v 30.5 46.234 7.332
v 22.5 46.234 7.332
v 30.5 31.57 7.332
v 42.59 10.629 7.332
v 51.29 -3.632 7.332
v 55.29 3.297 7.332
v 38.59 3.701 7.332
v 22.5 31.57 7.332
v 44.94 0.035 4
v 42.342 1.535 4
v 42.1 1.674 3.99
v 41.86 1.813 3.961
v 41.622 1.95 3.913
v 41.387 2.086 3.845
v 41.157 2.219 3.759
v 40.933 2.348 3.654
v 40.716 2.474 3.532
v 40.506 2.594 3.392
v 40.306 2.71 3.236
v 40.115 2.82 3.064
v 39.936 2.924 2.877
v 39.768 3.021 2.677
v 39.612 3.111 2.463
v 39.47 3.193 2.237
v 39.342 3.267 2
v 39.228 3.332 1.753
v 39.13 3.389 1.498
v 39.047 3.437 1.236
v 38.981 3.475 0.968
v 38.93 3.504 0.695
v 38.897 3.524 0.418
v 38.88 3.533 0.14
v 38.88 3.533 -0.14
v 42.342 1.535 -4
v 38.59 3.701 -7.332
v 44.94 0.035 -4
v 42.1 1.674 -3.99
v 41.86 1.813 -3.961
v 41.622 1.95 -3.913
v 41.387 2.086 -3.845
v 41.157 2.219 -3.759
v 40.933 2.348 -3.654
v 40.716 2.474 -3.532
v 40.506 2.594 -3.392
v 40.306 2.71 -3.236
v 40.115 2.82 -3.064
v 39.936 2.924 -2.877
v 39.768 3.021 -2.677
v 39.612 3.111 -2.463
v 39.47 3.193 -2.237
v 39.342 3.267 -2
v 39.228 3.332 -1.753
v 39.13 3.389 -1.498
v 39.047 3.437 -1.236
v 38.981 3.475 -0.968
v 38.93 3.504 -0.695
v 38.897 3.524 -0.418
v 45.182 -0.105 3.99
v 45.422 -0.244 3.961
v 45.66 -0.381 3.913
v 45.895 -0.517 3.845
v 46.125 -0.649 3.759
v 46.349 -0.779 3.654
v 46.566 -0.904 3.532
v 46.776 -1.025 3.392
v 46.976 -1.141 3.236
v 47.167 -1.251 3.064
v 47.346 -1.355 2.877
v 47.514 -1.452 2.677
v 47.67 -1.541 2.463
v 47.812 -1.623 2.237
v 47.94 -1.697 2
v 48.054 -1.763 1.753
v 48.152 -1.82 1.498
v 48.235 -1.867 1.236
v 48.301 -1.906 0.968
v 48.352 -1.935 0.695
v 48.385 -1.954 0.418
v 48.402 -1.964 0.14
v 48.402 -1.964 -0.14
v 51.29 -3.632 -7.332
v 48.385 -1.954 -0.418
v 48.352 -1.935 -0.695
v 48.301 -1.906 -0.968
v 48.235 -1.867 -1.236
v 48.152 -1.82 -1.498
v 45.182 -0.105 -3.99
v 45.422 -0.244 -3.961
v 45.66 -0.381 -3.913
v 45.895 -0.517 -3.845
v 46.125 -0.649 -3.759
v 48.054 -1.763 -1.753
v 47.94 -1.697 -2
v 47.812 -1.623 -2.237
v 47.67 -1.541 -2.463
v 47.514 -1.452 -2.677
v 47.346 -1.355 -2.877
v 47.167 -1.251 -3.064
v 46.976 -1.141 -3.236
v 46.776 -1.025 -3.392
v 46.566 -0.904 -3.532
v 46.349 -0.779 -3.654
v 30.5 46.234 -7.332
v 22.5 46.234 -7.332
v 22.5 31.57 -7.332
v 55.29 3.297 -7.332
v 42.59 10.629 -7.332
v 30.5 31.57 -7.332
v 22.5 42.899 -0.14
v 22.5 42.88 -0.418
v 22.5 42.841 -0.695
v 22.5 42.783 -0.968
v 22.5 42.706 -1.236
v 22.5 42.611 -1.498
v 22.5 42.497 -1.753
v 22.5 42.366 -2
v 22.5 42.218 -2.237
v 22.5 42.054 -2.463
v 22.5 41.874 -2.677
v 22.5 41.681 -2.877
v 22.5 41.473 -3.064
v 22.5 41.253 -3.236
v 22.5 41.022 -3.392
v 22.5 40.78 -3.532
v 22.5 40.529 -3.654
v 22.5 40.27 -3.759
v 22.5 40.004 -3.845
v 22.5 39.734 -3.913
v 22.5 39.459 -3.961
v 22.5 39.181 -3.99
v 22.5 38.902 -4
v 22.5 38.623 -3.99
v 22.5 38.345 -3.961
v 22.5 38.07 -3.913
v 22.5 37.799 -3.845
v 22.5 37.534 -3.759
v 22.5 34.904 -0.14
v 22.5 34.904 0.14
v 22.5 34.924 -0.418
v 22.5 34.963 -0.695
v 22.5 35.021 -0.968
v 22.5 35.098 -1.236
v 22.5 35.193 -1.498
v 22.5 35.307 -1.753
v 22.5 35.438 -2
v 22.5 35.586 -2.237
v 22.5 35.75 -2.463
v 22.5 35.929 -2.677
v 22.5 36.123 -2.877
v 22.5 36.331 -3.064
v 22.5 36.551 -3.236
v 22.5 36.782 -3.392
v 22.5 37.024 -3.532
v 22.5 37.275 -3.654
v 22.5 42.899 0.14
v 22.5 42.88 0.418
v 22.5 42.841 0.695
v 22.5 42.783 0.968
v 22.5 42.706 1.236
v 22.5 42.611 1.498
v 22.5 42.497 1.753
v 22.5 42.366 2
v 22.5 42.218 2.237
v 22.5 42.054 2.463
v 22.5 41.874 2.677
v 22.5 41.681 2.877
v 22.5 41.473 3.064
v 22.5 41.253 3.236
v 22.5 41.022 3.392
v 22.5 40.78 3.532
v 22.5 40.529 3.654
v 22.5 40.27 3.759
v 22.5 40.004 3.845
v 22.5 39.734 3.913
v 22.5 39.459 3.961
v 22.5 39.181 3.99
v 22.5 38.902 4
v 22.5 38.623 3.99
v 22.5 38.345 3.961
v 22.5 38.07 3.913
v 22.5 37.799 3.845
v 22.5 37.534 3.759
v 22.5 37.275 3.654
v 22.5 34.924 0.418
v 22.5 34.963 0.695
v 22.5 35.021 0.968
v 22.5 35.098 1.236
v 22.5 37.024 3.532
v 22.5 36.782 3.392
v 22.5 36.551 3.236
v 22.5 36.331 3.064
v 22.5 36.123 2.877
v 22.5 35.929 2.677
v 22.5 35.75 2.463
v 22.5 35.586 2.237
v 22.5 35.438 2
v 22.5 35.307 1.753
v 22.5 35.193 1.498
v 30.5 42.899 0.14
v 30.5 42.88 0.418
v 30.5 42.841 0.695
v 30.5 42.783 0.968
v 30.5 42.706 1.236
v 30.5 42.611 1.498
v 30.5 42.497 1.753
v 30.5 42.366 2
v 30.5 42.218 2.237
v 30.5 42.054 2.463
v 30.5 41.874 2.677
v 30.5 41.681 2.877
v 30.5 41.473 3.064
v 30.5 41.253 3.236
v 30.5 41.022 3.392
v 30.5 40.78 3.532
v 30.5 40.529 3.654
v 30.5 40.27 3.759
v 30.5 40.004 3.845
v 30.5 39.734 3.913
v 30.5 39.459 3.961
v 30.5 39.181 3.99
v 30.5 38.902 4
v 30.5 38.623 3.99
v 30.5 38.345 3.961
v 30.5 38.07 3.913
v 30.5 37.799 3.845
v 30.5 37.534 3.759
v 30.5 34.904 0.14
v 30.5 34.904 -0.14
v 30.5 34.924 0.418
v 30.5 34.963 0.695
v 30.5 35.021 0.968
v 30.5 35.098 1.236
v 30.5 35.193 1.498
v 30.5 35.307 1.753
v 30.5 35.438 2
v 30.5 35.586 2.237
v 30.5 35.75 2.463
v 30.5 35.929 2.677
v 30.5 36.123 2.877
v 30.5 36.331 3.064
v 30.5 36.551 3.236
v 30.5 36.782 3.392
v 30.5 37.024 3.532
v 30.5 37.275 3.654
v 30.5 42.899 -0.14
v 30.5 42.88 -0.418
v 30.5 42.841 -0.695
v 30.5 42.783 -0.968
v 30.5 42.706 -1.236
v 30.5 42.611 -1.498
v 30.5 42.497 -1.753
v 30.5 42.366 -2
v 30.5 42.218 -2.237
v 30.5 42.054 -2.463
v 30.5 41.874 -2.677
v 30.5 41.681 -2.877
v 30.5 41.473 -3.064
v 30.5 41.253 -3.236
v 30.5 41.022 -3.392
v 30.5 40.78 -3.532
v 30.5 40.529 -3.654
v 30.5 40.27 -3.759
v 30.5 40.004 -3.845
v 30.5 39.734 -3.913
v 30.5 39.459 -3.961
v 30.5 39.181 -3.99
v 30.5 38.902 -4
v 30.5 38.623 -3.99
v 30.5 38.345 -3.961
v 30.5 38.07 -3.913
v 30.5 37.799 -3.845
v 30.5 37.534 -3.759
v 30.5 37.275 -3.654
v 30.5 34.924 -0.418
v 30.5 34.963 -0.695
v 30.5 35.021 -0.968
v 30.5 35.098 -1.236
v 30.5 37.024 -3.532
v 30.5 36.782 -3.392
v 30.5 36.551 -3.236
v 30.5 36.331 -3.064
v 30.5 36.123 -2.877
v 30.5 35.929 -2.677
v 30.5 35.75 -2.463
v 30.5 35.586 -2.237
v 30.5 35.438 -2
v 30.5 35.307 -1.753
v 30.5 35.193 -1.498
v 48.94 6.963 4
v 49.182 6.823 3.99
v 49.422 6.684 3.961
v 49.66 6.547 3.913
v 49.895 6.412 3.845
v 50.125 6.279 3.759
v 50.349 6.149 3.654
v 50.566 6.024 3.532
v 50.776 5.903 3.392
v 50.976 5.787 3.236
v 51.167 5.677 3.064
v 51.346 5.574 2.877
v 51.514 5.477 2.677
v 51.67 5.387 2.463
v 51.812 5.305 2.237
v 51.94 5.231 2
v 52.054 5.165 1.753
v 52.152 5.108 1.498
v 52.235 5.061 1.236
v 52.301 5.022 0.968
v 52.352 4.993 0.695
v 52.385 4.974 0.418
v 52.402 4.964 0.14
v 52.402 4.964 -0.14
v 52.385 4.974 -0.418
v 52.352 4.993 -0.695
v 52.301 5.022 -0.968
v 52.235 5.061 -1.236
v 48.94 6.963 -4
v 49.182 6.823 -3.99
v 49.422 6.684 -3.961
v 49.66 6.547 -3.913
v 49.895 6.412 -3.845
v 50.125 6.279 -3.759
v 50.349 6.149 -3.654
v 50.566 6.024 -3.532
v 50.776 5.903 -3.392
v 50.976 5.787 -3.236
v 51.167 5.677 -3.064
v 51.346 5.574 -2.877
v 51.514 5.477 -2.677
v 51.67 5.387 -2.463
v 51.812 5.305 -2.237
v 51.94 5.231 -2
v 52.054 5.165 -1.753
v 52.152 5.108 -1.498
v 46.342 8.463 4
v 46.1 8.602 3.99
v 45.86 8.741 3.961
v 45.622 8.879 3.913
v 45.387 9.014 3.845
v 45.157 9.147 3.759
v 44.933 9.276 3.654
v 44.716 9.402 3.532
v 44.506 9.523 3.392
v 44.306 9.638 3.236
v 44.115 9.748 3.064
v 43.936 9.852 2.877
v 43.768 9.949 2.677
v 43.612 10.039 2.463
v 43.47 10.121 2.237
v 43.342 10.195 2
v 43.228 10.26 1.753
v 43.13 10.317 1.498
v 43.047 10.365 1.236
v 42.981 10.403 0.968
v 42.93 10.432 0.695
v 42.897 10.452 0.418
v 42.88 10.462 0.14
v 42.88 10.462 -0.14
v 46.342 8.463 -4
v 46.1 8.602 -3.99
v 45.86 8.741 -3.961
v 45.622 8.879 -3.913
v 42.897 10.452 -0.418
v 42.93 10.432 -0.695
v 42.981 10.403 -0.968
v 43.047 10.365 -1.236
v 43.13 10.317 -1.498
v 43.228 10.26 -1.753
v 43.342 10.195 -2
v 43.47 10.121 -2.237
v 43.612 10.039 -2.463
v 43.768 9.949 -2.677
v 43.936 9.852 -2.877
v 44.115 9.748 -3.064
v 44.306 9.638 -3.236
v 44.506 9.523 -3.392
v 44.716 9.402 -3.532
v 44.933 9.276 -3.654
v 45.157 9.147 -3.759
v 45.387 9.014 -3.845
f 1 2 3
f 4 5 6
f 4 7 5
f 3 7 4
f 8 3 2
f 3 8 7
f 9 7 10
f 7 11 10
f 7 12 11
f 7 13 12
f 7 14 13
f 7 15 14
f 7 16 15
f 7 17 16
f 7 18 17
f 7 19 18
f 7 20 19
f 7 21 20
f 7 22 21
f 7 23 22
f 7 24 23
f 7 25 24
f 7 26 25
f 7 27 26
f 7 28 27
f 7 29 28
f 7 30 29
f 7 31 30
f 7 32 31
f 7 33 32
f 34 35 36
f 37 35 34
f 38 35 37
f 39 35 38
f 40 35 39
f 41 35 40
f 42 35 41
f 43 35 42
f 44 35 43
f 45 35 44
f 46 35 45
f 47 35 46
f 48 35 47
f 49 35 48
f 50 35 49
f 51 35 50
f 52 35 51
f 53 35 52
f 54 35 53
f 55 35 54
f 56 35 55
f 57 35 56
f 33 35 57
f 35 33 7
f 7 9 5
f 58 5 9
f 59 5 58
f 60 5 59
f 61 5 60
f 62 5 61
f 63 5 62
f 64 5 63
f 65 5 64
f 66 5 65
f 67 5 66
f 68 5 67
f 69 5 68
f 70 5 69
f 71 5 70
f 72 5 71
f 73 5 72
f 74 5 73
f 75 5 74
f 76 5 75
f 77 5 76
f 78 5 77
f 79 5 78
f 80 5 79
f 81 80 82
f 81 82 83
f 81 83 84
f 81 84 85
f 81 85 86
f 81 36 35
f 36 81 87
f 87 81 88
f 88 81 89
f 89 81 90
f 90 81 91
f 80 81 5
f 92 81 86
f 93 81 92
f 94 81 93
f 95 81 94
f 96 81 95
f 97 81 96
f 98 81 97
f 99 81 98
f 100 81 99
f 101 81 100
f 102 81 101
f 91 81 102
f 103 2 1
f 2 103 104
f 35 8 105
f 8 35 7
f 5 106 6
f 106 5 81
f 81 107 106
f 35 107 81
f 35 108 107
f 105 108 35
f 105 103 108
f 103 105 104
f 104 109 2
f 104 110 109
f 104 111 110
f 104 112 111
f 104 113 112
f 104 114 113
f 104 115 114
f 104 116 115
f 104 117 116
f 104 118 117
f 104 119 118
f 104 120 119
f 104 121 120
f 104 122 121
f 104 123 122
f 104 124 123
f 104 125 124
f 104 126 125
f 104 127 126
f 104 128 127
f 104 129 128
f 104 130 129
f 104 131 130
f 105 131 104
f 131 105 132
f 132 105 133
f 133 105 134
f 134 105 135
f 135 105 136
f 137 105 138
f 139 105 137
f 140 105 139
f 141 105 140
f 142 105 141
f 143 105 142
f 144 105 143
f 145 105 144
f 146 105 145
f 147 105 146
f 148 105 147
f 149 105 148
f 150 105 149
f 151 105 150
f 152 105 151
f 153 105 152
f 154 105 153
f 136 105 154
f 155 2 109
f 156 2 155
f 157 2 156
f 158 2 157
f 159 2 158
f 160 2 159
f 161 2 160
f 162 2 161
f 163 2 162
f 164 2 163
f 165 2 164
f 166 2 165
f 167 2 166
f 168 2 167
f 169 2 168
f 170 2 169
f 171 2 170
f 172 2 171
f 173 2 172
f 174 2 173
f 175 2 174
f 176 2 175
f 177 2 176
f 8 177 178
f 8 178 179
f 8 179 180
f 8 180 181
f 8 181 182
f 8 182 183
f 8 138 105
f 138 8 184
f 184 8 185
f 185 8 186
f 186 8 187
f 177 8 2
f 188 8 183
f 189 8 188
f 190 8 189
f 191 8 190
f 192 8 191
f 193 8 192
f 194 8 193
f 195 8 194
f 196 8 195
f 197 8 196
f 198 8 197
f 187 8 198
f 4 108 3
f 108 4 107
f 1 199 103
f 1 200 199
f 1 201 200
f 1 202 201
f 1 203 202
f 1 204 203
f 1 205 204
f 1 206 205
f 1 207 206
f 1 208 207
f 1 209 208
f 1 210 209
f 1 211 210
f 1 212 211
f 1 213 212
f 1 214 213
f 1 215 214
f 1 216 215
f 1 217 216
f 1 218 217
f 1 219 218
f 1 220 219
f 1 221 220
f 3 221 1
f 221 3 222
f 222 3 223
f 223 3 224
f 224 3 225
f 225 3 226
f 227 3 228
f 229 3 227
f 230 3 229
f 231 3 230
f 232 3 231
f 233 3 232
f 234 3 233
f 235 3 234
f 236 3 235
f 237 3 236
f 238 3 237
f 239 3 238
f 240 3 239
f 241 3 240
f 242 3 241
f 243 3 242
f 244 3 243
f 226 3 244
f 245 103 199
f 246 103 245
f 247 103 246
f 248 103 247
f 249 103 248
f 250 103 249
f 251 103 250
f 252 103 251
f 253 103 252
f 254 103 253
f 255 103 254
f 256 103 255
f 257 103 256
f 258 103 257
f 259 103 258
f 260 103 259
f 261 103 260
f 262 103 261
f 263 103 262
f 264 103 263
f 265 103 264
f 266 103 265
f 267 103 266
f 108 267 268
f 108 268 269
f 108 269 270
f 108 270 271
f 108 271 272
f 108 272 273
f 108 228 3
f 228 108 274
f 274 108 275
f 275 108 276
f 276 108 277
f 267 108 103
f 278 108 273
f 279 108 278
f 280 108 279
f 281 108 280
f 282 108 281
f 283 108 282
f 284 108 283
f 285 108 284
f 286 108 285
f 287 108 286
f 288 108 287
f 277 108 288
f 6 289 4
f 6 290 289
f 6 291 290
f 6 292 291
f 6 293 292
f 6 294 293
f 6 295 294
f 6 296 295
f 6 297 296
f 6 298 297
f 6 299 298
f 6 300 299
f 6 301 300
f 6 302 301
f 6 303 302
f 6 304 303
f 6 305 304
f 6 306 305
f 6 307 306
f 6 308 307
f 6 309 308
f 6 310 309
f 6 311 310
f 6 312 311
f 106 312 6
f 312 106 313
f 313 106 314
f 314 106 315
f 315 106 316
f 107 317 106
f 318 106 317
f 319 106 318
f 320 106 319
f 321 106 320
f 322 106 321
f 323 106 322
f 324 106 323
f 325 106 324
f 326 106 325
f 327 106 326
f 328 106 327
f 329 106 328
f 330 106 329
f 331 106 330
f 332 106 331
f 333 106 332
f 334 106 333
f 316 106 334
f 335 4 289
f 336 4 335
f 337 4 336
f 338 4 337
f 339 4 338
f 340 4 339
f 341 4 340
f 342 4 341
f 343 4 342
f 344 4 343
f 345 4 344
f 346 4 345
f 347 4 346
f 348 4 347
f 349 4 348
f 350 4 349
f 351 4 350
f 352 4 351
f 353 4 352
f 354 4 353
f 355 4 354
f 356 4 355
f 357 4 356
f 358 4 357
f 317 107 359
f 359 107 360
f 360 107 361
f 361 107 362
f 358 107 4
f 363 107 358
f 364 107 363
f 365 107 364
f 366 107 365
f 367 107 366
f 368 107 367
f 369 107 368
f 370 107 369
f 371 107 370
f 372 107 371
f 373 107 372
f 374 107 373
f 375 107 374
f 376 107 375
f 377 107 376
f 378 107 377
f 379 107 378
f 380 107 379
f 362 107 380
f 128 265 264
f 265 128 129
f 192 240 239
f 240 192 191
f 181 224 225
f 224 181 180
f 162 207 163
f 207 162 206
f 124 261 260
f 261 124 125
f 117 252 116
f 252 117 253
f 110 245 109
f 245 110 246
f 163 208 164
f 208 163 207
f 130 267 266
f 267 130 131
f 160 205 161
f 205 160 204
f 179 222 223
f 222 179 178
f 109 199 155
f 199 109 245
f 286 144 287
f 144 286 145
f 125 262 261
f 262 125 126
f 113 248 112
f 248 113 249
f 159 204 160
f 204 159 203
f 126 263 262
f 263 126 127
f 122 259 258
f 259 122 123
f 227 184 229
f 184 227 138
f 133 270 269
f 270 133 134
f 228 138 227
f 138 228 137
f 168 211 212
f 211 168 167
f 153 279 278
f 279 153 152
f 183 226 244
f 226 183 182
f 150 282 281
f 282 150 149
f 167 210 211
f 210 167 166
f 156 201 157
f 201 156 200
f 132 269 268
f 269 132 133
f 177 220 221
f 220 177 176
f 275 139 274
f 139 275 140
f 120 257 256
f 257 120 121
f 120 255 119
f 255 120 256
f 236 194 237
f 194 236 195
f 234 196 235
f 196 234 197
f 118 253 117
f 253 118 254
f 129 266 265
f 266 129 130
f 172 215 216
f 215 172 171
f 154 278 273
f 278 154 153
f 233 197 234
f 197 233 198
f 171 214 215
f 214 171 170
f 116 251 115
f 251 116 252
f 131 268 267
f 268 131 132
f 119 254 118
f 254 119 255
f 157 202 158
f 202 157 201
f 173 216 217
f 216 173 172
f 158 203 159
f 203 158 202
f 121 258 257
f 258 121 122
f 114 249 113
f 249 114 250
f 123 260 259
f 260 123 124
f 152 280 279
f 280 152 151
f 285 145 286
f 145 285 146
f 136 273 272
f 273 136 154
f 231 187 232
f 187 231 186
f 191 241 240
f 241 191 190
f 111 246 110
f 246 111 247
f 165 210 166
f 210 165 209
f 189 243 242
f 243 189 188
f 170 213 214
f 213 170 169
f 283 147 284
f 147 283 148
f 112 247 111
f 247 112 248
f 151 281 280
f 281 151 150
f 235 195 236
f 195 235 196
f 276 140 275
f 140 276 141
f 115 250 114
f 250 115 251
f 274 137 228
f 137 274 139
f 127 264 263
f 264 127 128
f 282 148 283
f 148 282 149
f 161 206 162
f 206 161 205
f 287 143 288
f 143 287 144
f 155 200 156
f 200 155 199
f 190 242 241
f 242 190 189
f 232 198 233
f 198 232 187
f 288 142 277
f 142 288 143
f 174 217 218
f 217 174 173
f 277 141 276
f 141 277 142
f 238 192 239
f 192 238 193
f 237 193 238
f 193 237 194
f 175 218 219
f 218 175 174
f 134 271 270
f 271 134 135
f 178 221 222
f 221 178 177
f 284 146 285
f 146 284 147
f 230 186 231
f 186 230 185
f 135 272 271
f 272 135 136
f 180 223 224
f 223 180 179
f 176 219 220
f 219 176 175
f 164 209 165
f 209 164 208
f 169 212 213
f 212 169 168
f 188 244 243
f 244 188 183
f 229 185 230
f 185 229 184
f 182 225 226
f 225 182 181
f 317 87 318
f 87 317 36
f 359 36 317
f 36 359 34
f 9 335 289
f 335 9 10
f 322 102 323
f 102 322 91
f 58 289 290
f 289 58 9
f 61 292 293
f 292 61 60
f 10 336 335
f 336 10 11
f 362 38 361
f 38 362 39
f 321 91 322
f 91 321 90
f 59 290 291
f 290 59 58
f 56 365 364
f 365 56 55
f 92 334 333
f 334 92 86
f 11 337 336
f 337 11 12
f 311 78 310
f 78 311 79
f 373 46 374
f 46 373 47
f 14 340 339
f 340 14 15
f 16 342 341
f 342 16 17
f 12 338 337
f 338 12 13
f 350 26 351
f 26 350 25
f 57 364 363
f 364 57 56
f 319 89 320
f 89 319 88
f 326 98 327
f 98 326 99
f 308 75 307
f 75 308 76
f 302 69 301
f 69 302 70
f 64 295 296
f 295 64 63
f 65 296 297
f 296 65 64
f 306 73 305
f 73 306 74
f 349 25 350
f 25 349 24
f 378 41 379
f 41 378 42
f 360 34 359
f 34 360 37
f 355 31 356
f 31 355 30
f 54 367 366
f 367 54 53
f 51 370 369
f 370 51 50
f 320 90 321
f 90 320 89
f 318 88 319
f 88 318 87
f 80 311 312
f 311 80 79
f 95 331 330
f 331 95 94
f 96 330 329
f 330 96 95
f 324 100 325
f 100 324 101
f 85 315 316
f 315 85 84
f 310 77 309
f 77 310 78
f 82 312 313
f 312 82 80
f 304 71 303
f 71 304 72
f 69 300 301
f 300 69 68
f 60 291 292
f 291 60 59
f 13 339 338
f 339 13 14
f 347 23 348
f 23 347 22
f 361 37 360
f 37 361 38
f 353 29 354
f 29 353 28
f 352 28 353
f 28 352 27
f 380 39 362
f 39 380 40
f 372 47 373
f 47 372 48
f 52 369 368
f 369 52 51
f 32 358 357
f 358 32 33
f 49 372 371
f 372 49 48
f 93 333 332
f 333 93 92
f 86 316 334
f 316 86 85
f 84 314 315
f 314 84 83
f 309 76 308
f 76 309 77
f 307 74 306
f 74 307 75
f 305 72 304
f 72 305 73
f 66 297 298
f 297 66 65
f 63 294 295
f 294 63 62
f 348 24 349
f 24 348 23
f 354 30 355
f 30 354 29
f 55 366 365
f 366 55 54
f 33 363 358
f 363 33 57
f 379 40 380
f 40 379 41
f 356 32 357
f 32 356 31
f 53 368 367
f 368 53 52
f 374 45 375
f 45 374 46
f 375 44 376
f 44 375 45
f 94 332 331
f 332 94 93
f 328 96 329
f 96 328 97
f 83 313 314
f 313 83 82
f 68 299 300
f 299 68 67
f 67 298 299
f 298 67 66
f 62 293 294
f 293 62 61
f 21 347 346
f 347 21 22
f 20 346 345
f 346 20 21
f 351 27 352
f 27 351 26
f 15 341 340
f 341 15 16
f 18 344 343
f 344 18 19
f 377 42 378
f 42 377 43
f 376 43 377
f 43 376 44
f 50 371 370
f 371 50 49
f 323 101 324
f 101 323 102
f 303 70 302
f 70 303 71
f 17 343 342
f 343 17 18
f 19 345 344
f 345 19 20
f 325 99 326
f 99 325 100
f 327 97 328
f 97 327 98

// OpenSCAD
// diameter of the tube (mm)
tubeDiameter = 2.197*25.4; 

// hole size of the bearing (mm)
bearingHoleDiameter = 8;

// bearing diameter (mm)
bearingDiameter = 22;

// bearing width (mm)
bearingWidth = 7;

// bearing collar thickness (mm)
bearingCollarThickness = 2;

// minimum thickness of the walls (mm)
wallThickness = 15;

// minimum thickness of the walls (mm)
wallHeight = 0;

// the space between the bearing and the wall (mm)
tolerance = 2;

// the space between the tube and the wall (mm)
tubeTolerance = 2;

// determines beefiness of edge extensions
beefiness = 2;//9;

reinforcement = 8;

hexHead = 25.4/2;

module Outer() {
translate([bearingWidth/2,tubeDiameter/2+bearingDiameter/2,0])
    rotate([0,90,0]) union() {
        hull() {
                cylinder(r=bearingHoleDiameter/2+bearingCollarThickness,h=0.01,$fn=90);
                translate([0,0,tolerance])
                    cylinder(r=bearingHoleDiameter/2+bearingCollarThickness+tolerance,h=0.01,$fn=90);
        }
        translate([-bearingDiameter/2-wallHeight,-bearingDiameter/2-wallThickness,tolerance])
            cube([bearingDiameter+2*wallHeight,bearingDiameter+wallThickness+2*tolerance,wallThickness]);
        hull() {
                translate([0,0,2*tolerance+wallThickness])
                    cylinder(r=bearingHoleDiameter/2+bearingCollarThickness,h=0.01,$fn=90);
                translate([0,0,tolerance+wallThickness])
                    cylinder(r=bearingHoleDiameter/2+bearingCollarThickness+tolerance,h=0.01,$fn=90);
        }
    }
}

module cylinder_outer(height,radius,fn){
   fudge = 1/cos(180/fn);
   cylinder(h=height,r=radius*fudge,$fn=fn);
}
fudge = 1/cos(180/6);
module BraceSingle() {
    lip = 0;
translate([bearingWidth/2,tubeDiameter/2+bearingDiameter/2,0])
    rotate([0,90,0]) union() {
        hull() {
                translate([-lip/2-fudge*hexHead/2,-lip/2-fudge*hexHead/2,2*tolerance+wallThickness])
                    cube([fudge*hexHead+lip,fudge*hexHead+lip,reinforcement]);
        }
    }
}

module BraceReliefSingle() {
    lip = 0;
translate([bearingWidth/2,tubeDiameter/2+bearingDiameter/2,0])
    rotate([0,90,0]) union() {
        hull() {
                translate([-lip/2-fudge*hexHead/2,-lip/2-fudge*hexHead/2,2*tolerance+wallThickness+reinforcement])
                    cube([fudge*hexHead+lip,fudge*hexHead+lip,100]);
        }
    }
}

module Inner() {
    translate([bearingWidth/2,tubeDiameter/2+bearingDiameter/2,0])
        rotate([0,90,0]) 
            cylinder(r=bearingHoleDiameter/2,h=100, $fn=90); // arbitrary large value for hole length
}

module Bearing() {
    translate([0,tubeDiameter/2+bearingDiameter/2,0])
        rotate([0,90,0]) color("red", 0.5)
            cylinder(r=bearingDiameter/2,h=bearingWidth, center=true, $fn=90); 
}

module Tube() {
    color("green", 0.5)
        cylinder(r=tubeDiameter/2,h=100, center=true, $fn=90); 
}

module Brace()
{
    elongate = 3;
    difference() {
        hull() {
            BraceSingle();
            rotate([0,0,-120]) mirror([1,0,0]) BraceSingle();
        }
        hull() {
            BraceReliefSingle();
            rotate([0,0,-120]) mirror([1,0,0]) {
                BraceReliefSingle();
            }
        }
        Inner();
        hull() rotate([0,0,-120]) mirror([1,0,0]) {
            Inner();
            translate([0,-elongate,0]) Inner();
        }
    }
}

Brace();
